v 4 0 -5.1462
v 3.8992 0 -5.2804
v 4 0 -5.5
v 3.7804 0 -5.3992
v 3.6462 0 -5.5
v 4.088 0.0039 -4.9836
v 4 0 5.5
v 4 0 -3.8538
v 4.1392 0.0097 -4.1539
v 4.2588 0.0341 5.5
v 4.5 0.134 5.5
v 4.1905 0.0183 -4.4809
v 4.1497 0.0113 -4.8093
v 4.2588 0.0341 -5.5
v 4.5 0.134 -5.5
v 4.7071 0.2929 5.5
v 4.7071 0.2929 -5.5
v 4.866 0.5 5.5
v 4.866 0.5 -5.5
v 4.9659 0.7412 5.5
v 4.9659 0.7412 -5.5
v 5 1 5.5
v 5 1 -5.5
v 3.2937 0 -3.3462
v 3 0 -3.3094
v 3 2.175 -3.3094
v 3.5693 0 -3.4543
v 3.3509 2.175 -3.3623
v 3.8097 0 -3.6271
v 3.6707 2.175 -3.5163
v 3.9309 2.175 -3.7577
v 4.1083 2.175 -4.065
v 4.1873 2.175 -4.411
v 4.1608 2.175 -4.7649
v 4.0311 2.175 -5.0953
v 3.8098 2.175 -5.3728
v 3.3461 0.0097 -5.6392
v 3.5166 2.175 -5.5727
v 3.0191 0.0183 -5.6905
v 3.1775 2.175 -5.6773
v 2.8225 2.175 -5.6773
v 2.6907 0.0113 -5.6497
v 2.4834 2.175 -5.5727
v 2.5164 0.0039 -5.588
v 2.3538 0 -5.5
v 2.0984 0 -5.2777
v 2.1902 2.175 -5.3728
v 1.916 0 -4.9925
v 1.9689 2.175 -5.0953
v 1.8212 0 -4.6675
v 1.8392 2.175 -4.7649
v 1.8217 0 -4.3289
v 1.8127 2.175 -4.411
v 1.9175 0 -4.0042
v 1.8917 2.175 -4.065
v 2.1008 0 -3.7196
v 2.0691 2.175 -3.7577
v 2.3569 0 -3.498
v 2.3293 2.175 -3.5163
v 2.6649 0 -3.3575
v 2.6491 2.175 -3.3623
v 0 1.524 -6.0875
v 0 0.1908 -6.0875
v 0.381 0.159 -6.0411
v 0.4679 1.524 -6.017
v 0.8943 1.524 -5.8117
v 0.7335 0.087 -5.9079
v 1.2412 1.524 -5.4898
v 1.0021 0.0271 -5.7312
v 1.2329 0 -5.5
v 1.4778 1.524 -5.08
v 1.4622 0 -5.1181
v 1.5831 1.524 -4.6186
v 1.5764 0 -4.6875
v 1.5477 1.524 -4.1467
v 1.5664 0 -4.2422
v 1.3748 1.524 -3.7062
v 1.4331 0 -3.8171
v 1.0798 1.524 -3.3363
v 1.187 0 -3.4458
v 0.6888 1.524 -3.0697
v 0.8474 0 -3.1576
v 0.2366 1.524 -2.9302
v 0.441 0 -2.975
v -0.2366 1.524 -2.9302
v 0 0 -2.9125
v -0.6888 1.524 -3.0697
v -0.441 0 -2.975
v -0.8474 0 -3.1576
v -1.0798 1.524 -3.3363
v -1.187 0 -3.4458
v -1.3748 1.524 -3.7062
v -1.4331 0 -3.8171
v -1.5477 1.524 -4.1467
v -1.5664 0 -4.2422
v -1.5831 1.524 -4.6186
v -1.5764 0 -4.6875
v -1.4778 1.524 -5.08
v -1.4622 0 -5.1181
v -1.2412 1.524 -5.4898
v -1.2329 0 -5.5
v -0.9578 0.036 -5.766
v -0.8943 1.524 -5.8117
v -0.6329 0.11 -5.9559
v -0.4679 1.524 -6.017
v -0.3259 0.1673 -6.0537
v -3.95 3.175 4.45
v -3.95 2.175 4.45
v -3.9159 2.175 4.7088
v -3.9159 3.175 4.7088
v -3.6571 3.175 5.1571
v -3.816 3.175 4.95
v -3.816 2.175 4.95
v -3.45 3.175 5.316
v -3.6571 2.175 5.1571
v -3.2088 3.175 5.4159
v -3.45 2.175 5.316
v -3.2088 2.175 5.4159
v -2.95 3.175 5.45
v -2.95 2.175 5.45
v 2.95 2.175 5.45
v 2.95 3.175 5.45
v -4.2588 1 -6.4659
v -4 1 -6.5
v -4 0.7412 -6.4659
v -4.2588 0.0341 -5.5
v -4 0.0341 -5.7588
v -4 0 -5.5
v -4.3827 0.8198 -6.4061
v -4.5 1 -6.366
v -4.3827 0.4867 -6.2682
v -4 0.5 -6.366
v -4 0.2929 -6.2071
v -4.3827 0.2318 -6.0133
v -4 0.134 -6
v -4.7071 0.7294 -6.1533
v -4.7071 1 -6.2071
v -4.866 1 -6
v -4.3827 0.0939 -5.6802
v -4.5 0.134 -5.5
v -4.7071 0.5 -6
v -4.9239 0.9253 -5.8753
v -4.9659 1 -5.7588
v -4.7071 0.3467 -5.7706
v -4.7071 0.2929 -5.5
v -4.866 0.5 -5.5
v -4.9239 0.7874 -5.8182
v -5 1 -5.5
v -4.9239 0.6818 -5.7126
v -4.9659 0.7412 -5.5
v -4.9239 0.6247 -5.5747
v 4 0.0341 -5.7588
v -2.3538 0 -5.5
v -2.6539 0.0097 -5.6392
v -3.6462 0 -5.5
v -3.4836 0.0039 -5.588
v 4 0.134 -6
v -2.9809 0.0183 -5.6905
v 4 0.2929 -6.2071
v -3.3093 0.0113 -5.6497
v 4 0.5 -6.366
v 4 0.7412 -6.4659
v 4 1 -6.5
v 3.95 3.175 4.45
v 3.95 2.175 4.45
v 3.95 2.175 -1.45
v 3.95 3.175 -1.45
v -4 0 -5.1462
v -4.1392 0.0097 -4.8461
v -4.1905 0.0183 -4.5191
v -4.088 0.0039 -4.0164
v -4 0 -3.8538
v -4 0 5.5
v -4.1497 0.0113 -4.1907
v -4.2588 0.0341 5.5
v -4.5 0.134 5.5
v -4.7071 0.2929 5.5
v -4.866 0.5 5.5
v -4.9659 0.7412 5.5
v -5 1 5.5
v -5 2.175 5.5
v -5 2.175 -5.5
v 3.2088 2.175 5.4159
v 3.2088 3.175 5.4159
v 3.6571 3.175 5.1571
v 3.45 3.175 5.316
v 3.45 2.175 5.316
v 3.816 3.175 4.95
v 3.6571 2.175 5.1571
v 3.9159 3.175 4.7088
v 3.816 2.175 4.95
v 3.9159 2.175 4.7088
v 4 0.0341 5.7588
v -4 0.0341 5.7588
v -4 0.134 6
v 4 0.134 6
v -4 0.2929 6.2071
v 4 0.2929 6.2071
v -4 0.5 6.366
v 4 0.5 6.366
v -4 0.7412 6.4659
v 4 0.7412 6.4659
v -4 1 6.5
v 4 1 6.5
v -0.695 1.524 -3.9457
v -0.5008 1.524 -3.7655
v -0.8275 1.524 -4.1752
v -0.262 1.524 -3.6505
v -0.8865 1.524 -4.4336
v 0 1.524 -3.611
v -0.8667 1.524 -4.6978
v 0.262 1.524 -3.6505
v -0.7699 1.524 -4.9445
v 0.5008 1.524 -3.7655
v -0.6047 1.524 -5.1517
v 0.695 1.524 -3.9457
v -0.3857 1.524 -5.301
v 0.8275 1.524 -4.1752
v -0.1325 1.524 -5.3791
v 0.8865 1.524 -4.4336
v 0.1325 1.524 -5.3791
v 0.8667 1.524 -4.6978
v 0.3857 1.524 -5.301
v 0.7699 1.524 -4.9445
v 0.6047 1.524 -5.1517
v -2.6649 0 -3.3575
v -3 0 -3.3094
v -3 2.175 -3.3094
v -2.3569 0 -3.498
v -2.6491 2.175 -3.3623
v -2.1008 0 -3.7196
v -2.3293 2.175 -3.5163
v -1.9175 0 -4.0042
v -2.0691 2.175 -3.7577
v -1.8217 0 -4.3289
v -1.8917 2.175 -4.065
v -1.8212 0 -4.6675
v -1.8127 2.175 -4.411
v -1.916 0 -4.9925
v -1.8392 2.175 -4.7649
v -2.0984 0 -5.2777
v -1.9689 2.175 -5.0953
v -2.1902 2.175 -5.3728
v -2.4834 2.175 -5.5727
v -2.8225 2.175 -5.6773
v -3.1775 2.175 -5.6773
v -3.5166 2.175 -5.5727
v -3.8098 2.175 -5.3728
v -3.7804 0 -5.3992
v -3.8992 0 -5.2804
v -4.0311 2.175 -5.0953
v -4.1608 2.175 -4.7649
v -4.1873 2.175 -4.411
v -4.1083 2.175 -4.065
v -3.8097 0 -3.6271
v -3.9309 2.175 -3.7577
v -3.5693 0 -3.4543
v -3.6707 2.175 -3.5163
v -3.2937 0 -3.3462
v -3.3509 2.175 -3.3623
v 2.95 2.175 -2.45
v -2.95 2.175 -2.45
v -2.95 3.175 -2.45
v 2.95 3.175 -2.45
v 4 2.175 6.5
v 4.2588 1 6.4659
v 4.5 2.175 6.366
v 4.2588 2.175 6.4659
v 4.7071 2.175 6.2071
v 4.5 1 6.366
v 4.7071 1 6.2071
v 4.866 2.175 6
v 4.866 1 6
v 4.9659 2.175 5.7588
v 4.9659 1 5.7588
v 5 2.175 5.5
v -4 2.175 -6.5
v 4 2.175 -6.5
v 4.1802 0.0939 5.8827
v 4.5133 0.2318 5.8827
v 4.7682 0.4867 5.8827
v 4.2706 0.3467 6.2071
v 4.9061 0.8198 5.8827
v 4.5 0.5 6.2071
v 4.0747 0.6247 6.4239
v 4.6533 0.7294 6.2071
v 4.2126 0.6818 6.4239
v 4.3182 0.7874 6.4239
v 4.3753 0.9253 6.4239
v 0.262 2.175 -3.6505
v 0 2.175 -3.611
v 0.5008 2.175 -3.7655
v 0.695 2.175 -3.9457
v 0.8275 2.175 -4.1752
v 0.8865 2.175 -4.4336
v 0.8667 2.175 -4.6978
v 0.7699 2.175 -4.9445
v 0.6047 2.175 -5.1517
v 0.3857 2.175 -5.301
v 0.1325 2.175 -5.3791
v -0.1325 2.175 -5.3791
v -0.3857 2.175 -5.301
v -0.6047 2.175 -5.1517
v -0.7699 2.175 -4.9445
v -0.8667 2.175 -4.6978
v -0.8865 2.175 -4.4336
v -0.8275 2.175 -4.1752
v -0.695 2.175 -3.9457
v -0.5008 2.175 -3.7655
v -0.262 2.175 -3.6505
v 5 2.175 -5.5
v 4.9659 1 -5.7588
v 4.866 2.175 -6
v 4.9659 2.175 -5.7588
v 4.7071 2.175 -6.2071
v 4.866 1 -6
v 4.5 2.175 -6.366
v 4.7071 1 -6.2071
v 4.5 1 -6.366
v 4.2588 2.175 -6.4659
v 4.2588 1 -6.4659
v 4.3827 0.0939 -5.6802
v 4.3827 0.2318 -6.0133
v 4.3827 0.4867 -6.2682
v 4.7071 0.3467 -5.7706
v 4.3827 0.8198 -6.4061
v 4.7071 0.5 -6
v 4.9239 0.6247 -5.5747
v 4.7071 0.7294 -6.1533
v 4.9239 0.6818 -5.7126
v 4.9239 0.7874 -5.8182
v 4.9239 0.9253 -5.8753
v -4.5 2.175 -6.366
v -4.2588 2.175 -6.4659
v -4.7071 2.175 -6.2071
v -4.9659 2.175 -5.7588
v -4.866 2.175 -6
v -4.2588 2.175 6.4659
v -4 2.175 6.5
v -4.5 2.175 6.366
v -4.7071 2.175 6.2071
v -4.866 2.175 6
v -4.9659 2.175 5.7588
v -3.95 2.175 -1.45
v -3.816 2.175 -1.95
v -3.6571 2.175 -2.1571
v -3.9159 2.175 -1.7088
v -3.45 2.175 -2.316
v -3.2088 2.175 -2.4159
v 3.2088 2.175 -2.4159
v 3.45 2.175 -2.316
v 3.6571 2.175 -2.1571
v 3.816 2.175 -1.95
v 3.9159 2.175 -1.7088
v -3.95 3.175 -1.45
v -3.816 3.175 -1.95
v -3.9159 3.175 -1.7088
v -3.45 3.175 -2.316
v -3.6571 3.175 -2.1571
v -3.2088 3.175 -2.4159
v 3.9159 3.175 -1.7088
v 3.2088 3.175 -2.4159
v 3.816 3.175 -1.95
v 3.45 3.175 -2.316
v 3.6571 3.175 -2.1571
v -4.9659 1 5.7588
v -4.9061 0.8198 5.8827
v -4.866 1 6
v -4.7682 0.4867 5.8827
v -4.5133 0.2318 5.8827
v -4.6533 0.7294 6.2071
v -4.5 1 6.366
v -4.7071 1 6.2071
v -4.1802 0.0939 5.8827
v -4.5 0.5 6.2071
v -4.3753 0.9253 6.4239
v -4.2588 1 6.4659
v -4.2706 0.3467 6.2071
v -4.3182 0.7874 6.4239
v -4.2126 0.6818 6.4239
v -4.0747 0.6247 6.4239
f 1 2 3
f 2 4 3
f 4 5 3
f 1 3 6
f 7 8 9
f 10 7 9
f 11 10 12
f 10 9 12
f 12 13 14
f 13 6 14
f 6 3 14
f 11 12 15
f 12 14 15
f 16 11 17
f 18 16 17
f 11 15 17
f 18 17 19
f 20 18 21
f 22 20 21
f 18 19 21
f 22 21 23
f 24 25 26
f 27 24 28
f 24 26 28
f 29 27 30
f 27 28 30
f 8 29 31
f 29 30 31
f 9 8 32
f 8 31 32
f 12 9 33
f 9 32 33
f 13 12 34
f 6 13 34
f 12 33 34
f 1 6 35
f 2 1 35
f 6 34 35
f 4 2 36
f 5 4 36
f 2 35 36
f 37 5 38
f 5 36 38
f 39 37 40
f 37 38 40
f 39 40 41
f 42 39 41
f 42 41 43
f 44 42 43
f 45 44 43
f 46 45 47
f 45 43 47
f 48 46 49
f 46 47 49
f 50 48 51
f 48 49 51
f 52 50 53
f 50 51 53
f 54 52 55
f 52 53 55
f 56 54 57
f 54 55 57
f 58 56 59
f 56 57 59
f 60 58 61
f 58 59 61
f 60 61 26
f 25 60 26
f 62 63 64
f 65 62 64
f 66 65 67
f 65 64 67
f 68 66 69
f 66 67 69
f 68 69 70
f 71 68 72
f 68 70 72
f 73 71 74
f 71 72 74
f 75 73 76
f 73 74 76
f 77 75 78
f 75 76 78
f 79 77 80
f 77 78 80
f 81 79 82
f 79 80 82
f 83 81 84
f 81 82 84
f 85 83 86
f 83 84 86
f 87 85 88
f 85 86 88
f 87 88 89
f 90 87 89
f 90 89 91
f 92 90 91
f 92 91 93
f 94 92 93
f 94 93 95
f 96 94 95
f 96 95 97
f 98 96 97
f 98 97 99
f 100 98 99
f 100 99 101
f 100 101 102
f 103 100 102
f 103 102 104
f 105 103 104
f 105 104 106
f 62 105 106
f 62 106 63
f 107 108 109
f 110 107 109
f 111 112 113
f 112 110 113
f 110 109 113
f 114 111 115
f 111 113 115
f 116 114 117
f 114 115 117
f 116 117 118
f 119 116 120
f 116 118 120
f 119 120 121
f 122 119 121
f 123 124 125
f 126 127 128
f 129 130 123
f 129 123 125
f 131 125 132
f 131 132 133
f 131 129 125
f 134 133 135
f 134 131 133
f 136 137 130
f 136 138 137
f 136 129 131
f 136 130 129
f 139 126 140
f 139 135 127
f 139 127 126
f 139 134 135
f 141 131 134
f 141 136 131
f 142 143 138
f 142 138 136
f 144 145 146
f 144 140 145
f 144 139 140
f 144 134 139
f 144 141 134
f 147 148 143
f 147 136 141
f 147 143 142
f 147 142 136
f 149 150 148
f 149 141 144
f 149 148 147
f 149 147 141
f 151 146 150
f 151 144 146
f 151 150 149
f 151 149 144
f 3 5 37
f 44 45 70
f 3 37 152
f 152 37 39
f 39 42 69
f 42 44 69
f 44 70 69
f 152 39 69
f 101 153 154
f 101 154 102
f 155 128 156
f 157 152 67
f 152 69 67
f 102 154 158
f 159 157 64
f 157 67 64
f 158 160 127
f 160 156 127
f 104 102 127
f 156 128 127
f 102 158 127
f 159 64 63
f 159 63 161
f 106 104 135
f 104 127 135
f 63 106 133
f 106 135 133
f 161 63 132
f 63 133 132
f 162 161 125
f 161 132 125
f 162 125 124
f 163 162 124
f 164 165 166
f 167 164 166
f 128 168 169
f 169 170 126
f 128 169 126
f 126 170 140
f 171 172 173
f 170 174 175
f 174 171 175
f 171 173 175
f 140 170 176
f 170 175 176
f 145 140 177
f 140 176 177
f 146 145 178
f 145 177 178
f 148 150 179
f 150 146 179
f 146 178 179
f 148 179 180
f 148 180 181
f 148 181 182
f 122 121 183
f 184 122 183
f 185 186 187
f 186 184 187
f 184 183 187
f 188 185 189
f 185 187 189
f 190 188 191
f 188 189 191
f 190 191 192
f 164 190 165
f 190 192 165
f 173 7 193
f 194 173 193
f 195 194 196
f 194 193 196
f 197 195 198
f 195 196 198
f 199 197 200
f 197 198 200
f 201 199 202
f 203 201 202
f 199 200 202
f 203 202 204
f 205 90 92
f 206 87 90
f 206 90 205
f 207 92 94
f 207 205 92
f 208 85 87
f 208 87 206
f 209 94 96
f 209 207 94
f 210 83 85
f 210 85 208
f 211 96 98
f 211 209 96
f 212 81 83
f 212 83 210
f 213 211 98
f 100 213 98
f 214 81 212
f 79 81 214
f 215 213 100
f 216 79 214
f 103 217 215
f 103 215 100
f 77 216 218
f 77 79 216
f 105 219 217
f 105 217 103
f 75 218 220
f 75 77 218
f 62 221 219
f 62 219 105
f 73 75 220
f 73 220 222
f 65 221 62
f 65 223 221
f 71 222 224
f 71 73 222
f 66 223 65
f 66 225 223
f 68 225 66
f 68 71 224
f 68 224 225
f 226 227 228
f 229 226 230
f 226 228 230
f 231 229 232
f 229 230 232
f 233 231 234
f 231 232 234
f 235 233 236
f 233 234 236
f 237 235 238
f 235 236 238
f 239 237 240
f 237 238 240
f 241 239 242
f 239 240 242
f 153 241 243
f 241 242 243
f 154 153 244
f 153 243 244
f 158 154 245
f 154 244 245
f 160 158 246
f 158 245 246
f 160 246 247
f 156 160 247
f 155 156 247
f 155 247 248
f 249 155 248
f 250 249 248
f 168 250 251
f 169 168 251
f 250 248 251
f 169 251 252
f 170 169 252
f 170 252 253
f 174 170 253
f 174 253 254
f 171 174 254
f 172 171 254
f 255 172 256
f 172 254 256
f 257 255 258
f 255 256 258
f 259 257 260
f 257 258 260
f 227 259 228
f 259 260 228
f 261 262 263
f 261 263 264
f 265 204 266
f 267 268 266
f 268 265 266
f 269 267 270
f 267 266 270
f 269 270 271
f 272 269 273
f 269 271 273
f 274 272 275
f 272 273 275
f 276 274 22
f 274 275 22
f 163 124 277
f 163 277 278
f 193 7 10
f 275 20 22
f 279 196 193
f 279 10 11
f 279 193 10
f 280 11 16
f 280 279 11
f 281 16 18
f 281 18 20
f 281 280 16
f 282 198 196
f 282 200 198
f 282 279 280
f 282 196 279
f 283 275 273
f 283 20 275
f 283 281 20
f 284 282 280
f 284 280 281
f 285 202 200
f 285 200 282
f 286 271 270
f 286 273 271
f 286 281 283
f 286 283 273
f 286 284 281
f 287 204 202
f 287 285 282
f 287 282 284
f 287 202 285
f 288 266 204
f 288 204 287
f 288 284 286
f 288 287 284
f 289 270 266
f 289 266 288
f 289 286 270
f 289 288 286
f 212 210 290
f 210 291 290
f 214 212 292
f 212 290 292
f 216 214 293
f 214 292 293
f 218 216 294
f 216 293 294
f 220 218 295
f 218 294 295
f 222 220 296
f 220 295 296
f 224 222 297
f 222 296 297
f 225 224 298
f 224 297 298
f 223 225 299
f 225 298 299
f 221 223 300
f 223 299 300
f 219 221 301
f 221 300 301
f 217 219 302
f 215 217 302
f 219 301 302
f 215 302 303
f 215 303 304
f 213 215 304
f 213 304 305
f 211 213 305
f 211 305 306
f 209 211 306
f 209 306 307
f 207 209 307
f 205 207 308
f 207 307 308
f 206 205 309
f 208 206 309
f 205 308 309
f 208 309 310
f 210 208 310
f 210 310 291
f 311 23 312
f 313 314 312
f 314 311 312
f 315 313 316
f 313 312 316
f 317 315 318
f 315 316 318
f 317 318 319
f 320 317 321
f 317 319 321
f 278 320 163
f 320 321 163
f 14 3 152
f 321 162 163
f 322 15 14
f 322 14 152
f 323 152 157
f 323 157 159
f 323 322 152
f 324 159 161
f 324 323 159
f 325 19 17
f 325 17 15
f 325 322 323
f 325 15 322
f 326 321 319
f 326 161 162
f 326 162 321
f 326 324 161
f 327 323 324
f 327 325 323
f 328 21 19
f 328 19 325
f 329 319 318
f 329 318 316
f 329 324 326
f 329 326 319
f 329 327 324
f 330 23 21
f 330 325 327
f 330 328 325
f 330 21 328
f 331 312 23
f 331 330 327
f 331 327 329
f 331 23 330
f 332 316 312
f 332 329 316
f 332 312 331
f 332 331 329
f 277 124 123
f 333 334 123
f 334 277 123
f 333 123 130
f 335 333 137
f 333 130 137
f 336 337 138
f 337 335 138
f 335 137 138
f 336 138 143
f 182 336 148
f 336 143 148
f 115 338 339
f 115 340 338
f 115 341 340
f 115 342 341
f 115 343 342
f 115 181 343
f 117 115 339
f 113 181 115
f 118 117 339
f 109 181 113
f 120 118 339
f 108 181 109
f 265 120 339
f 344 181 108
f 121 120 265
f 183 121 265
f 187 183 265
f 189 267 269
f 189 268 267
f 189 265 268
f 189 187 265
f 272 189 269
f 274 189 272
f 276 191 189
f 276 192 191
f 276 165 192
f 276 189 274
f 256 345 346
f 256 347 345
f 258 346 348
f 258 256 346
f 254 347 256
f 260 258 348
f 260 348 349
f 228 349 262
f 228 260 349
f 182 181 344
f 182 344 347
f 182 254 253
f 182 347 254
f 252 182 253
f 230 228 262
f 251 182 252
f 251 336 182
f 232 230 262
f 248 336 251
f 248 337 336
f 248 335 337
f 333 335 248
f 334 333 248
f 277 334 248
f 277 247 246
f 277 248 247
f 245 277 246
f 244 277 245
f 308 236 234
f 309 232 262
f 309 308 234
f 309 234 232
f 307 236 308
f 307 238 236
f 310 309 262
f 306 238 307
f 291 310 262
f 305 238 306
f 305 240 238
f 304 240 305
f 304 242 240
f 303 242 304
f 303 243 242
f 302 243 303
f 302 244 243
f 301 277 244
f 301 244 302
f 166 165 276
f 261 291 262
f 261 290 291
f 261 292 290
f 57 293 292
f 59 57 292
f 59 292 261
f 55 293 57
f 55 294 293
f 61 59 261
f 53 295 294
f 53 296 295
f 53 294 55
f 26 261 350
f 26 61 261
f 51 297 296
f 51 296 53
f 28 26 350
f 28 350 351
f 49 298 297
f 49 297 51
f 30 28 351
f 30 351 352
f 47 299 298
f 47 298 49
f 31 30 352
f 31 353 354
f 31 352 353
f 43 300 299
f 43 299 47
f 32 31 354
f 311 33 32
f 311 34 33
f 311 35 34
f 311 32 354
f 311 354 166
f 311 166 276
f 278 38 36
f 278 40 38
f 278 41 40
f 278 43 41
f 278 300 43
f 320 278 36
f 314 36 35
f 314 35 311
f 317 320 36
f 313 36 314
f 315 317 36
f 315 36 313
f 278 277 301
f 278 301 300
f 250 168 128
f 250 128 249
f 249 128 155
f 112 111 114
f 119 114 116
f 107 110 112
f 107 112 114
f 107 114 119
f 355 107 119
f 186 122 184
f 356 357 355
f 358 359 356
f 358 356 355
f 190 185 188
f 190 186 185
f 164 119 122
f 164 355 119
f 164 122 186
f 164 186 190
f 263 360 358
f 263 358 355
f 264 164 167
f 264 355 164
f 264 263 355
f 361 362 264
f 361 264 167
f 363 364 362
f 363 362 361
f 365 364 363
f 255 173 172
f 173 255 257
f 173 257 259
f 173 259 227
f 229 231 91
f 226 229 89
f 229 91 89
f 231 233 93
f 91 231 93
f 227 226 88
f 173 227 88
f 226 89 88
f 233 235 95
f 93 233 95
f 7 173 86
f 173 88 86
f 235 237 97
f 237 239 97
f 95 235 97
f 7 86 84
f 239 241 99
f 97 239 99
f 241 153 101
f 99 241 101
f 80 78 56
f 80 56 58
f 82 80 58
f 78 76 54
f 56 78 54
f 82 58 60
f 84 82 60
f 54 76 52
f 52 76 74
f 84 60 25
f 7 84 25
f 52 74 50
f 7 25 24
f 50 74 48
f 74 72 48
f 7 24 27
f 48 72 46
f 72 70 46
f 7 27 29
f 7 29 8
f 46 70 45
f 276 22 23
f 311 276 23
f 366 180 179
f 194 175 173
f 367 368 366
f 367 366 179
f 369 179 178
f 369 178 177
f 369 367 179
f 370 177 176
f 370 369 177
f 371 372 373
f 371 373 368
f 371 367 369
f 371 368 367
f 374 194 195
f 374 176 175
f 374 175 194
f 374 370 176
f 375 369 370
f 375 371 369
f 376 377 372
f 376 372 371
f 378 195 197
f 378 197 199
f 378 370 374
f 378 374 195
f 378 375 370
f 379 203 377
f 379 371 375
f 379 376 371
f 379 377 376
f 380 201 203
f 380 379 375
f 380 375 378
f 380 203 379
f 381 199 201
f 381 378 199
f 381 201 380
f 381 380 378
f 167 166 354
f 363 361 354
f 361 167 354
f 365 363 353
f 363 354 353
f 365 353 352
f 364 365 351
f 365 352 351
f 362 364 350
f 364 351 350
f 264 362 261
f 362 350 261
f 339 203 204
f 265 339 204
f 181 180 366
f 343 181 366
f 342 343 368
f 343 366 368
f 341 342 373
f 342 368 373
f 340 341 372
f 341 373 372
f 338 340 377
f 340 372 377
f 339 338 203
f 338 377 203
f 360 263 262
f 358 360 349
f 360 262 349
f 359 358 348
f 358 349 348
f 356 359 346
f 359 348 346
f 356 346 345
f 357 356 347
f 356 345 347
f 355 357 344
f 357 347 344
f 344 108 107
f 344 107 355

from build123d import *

# Parameters (mm, degrees)
SKETCH1_W                                      = 10
SKETCH1_H                                      = 13
EXTRUDE1_DEPTH                                 = 2.175
SKETCH3_W                                      = 7.9
SKETCH3_H                                      = 7.9
EXTRUDE3_DEPTH                                 = 1
CBORE_FOR_0_SOCKET_HEAD_CAP_SCREW1_D           = 1.778
CBORE_FOR_0_SOCKET_HEAD_CAP_SCREW1_CBORE_D     = 3.175
CBORE_FOR_0_SOCKET_HEAD_CAP_SCREW1_CBORE_DEPTH = 1.524
F_3_32_0_09375_DIAMETER_HOLE1_D                = 2.38125
F_3_32_0_09375_DIAMETER_HOLE1_DEPTH            = 10
F_3_32_0_09375_DIAMETER_HOLE1_TIP              = 0.715399675
FILLET3_R                                      = 1


with BuildPart() as part:
    # Sketch1 → Extrude1 (new body)
    with BuildSketch(Plane(origin=(0, 0, 0), x_dir=(1, 0, 0), z_dir=(0, 1, 0))):
        Rectangle(SKETCH1_W, SKETCH1_H)
    extrude(amount=EXTRUDE1_DEPTH)

    # Sketch3 → Extrude3 (add)
    with BuildSketch(Plane(origin=(0, 2.175, 0), x_dir=(1, 0, 0), z_dir=(0, 1, 0))):
        with Locations((0, -1.5)):
            Rectangle(SKETCH3_W, SKETCH3_H)
    extrude(amount=EXTRUDE3_DEPTH)

    # CBORE for #0 Socket Head Cap Screw1 (through all)
    with Locations(Plane(origin=(0, 0, -4.5), x_dir=(0, 0, -1), z_dir=(0, -1, 0))):
        with Locations((0, 0)):
            CounterBoreHole(CBORE_FOR_0_SOCKET_HEAD_CAP_SCREW1_D / 2, CBORE_FOR_0_SOCKET_HEAD_CAP_SCREW1_CBORE_D / 2, CBORE_FOR_0_SOCKET_HEAD_CAP_SCREW1_CBORE_DEPTH)

    # 3/32 (0.09375) Diameter Hole1
    with Locations(Plane(origin=(-3, 0, -4.5), x_dir=(0, 0, -1), z_dir=(0, -1, 0))):
        with Locations((0, 0), (0, 6)):
            Hole(F_3_32_0_09375_DIAMETER_HOLE1_D / 2, depth=F_3_32_0_09375_DIAMETER_HOLE1_DEPTH)
            with Locations((0, 0, -(F_3_32_0_09375_DIAMETER_HOLE1_DEPTH + F_3_32_0_09375_DIAMETER_HOLE1_TIP / 2))):  # 118° drill point
                Cone(0, F_3_32_0_09375_DIAMETER_HOLE1_D / 2, F_3_32_0_09375_DIAMETER_HOLE1_TIP, mode=Mode.SUBTRACT)

    # Fillet3
    # the kernel refuses this fillet: 1 mm, written as the material it takes off along each edge
    with BuildSketch(Plane(origin=(-4, 1, -5.5), x_dir=(0, -1, 0), z_dir=(-1, 0, 0))) as fillet3_piece_1_section:
        Polygon((0, 0), (FILLET3_R, 0), (FILLET3_R, -FILLET3_R), (0, -FILLET3_R), align=None)
    fillet3_piece_1 = extrude(amount=FILLET3_R, mode=Mode.PRIVATE)
    fillet3_piece_1 = fillet3_piece_1 - Plane(origin=(-4, 1, -5.5), x_dir=(0, 0.7071067811865475, 0.7071067811865475), z_dir=(-1, 0, 0)) * Sphere(FILLET3_R, mode=Mode.PRIVATE)
    add(fillet3_piece_1, mode=Mode.SUBTRACT)
    with BuildSketch(Plane(origin=(4, 1, -5.5), x_dir=(0, -1, 0), z_dir=(1, 0, 0))) as fillet3_piece_2_section:
        Polygon((0, 0), (FILLET3_R, 0), (FILLET3_R, FILLET3_R), (0, FILLET3_R), align=None)
    fillet3_piece_2 = extrude(amount=FILLET3_R, mode=Mode.PRIVATE)
    fillet3_piece_2 = fillet3_piece_2 - Plane(origin=(4, 1, -5.5), x_dir=(0, 0.7071067811865475, 0.7071067811865475), z_dir=(1, 0, 0)) * Sphere(FILLET3_R, mode=Mode.PRIVATE)
    add(fillet3_piece_2, mode=Mode.SUBTRACT)
    with BuildSketch(Plane(origin=(4, 1, 5.5), x_dir=(1, 0, 0), z_dir=(0, 0, 1))) as fillet3_piece_3_section:
        Polygon((0, 0), (FILLET3_R, 0), (FILLET3_R, -FILLET3_R), (0, -FILLET3_R), align=None)
    fillet3_piece_3 = extrude(amount=FILLET3_R, mode=Mode.PRIVATE)
    fillet3_piece_3 = fillet3_piece_3 - Plane(origin=(4, 1, 5.5), x_dir=(-0.7071067811865475, 0.7071067811865475, 0), z_dir=(0, 0, 1)) * Sphere(FILLET3_R, mode=Mode.PRIVATE)
    add(fillet3_piece_3, mode=Mode.SUBTRACT)
    with BuildSketch(Plane(origin=(-4, 1, 5.5), x_dir=(-1, 0, 0), z_dir=(0, 0, 1))) as fillet3_piece_4_section:
        Polygon((0, 0), (FILLET3_R, 0), (FILLET3_R, FILLET3_R), (0, FILLET3_R), align=None)
    fillet3_piece_4 = extrude(amount=FILLET3_R, mode=Mode.PRIVATE)
    fillet3_piece_4 = fillet3_piece_4 - Plane(origin=(-4, 1, 5.5), x_dir=(0.7071067811865475, 0.7071067811865475, 0), z_dir=(0, 0, 1)) * Sphere(FILLET3_R, mode=Mode.PRIVATE)
    add(fillet3_piece_4, mode=Mode.SUBTRACT)
    with BuildSketch(Plane(origin=(-3.95, 2.175, -2.45), x_dir=(0, 0, 1), z_dir=(0, 1, 0)), Plane(origin=(3.95, 2.175, -2.45), x_dir=(-1, 0, 0), z_dir=(0, 1, 0))) as fillet3_piece_5:
        with BuildLine():
            CenterArc((FILLET3_R, FILLET3_R), FILLET3_R, 180, 90)
            Line((0, FILLET3_R), (0, 0))
            Line((0, 0), (FILLET3_R, 0))
        make_face()
    extrude(amount=3.5, mode=Mode.SUBTRACT)
    with BuildSketch(Plane(origin=(-3.95, 2.175, 5.45), x_dir=(0, 0, -1), z_dir=(0, 1, 0)), Plane(origin=(3.95, 2.175, 5.45), x_dir=(-1, 0, 0), z_dir=(0, 1, 0))) as fillet3_piece_6:
        with BuildLine():
            CenterArc((FILLET3_R, -FILLET3_R), FILLET3_R, 90, 90)
            Line((0, -FILLET3_R), (0, 0))
            Line((0, 0), (FILLET3_R, 0))
        make_face()
    extrude(amount=3.5, mode=Mode.SUBTRACT)
    with BuildSketch(Plane(origin=(-4, 0, -6.5), x_dir=(0, 0, 1), z_dir=(1, 0, 0))) as fillet3_piece_7:
        with BuildLine():
            CenterArc((FILLET3_R, -FILLET3_R), FILLET3_R, 90, 90)
            Line((0, -FILLET3_R), (0, 0))
            Line((0, 0), (FILLET3_R, 0))
        make_face()
    extrude(amount=8, mode=Mode.SUBTRACT)
    with BuildSketch(Plane(origin=(5, 0, -5.5), x_dir=(0, 1, 0), z_dir=(0, 0, 1)), Plane(origin=(-5, 0, 5.5), x_dir=(0, 1, 0), z_dir=(0, 0, -1))) as fillet3_piece_8:
        with BuildLine():
            CenterArc((FILLET3_R, FILLET3_R), FILLET3_R, 180, 90)
            Line((0, FILLET3_R), (0, 0))
            Line((0, 0), (FILLET3_R, 0))
        make_face()
    extrude(amount=11, mode=Mode.SUBTRACT)
    with BuildSketch(Plane(origin=(4, 0, 6.5), x_dir=(0, 1, 0), z_dir=(-1, 0, 0))) as fillet3_piece_9:
        with BuildLine():
            CenterArc((FILLET3_R, FILLET3_R), FILLET3_R, 180, 90)
            Line((0, FILLET3_R), (0, 0))
            Line((0, 0), (FILLET3_R, 0))
        make_face()
    extrude(amount=8, mode=Mode.SUBTRACT)
    with BuildSketch(Plane(origin=(-5, 1, -6.5), x_dir=(0, 0, 1), z_dir=(0, 1, 0)), Plane(origin=(-5, 1, 6.5), x_dir=(1, 0, 0), z_dir=(0, 1, 0))) as fillet3_piece_10:
        with BuildLine():
            CenterArc((FILLET3_R, FILLET3_R), FILLET3_R, 180, 90)
            Line((0, FILLET3_R), (0, 0))
            Line((0, 0), (FILLET3_R, 0))
        make_face()
    extrude(amount=3.675, mode=Mode.SUBTRACT)
    with BuildSketch(Plane(origin=(5, 1, -6.5), x_dir=(0, 0, 1), z_dir=(0, 1, 0)), Plane(origin=(5, 1, 6.5), x_dir=(-1, 0, 0), z_dir=(0, 1, 0))) as fillet3_piece_11:
        with BuildLine():
            CenterArc((FILLET3_R, -FILLET3_R), FILLET3_R, 90, 90)
            Line((0, -FILLET3_R), (0, 0))
            Line((0, 0), (FILLET3_R, 0))
        make_face()
    extrude(amount=3.675, mode=Mode.SUBTRACT)


solid = part.part
